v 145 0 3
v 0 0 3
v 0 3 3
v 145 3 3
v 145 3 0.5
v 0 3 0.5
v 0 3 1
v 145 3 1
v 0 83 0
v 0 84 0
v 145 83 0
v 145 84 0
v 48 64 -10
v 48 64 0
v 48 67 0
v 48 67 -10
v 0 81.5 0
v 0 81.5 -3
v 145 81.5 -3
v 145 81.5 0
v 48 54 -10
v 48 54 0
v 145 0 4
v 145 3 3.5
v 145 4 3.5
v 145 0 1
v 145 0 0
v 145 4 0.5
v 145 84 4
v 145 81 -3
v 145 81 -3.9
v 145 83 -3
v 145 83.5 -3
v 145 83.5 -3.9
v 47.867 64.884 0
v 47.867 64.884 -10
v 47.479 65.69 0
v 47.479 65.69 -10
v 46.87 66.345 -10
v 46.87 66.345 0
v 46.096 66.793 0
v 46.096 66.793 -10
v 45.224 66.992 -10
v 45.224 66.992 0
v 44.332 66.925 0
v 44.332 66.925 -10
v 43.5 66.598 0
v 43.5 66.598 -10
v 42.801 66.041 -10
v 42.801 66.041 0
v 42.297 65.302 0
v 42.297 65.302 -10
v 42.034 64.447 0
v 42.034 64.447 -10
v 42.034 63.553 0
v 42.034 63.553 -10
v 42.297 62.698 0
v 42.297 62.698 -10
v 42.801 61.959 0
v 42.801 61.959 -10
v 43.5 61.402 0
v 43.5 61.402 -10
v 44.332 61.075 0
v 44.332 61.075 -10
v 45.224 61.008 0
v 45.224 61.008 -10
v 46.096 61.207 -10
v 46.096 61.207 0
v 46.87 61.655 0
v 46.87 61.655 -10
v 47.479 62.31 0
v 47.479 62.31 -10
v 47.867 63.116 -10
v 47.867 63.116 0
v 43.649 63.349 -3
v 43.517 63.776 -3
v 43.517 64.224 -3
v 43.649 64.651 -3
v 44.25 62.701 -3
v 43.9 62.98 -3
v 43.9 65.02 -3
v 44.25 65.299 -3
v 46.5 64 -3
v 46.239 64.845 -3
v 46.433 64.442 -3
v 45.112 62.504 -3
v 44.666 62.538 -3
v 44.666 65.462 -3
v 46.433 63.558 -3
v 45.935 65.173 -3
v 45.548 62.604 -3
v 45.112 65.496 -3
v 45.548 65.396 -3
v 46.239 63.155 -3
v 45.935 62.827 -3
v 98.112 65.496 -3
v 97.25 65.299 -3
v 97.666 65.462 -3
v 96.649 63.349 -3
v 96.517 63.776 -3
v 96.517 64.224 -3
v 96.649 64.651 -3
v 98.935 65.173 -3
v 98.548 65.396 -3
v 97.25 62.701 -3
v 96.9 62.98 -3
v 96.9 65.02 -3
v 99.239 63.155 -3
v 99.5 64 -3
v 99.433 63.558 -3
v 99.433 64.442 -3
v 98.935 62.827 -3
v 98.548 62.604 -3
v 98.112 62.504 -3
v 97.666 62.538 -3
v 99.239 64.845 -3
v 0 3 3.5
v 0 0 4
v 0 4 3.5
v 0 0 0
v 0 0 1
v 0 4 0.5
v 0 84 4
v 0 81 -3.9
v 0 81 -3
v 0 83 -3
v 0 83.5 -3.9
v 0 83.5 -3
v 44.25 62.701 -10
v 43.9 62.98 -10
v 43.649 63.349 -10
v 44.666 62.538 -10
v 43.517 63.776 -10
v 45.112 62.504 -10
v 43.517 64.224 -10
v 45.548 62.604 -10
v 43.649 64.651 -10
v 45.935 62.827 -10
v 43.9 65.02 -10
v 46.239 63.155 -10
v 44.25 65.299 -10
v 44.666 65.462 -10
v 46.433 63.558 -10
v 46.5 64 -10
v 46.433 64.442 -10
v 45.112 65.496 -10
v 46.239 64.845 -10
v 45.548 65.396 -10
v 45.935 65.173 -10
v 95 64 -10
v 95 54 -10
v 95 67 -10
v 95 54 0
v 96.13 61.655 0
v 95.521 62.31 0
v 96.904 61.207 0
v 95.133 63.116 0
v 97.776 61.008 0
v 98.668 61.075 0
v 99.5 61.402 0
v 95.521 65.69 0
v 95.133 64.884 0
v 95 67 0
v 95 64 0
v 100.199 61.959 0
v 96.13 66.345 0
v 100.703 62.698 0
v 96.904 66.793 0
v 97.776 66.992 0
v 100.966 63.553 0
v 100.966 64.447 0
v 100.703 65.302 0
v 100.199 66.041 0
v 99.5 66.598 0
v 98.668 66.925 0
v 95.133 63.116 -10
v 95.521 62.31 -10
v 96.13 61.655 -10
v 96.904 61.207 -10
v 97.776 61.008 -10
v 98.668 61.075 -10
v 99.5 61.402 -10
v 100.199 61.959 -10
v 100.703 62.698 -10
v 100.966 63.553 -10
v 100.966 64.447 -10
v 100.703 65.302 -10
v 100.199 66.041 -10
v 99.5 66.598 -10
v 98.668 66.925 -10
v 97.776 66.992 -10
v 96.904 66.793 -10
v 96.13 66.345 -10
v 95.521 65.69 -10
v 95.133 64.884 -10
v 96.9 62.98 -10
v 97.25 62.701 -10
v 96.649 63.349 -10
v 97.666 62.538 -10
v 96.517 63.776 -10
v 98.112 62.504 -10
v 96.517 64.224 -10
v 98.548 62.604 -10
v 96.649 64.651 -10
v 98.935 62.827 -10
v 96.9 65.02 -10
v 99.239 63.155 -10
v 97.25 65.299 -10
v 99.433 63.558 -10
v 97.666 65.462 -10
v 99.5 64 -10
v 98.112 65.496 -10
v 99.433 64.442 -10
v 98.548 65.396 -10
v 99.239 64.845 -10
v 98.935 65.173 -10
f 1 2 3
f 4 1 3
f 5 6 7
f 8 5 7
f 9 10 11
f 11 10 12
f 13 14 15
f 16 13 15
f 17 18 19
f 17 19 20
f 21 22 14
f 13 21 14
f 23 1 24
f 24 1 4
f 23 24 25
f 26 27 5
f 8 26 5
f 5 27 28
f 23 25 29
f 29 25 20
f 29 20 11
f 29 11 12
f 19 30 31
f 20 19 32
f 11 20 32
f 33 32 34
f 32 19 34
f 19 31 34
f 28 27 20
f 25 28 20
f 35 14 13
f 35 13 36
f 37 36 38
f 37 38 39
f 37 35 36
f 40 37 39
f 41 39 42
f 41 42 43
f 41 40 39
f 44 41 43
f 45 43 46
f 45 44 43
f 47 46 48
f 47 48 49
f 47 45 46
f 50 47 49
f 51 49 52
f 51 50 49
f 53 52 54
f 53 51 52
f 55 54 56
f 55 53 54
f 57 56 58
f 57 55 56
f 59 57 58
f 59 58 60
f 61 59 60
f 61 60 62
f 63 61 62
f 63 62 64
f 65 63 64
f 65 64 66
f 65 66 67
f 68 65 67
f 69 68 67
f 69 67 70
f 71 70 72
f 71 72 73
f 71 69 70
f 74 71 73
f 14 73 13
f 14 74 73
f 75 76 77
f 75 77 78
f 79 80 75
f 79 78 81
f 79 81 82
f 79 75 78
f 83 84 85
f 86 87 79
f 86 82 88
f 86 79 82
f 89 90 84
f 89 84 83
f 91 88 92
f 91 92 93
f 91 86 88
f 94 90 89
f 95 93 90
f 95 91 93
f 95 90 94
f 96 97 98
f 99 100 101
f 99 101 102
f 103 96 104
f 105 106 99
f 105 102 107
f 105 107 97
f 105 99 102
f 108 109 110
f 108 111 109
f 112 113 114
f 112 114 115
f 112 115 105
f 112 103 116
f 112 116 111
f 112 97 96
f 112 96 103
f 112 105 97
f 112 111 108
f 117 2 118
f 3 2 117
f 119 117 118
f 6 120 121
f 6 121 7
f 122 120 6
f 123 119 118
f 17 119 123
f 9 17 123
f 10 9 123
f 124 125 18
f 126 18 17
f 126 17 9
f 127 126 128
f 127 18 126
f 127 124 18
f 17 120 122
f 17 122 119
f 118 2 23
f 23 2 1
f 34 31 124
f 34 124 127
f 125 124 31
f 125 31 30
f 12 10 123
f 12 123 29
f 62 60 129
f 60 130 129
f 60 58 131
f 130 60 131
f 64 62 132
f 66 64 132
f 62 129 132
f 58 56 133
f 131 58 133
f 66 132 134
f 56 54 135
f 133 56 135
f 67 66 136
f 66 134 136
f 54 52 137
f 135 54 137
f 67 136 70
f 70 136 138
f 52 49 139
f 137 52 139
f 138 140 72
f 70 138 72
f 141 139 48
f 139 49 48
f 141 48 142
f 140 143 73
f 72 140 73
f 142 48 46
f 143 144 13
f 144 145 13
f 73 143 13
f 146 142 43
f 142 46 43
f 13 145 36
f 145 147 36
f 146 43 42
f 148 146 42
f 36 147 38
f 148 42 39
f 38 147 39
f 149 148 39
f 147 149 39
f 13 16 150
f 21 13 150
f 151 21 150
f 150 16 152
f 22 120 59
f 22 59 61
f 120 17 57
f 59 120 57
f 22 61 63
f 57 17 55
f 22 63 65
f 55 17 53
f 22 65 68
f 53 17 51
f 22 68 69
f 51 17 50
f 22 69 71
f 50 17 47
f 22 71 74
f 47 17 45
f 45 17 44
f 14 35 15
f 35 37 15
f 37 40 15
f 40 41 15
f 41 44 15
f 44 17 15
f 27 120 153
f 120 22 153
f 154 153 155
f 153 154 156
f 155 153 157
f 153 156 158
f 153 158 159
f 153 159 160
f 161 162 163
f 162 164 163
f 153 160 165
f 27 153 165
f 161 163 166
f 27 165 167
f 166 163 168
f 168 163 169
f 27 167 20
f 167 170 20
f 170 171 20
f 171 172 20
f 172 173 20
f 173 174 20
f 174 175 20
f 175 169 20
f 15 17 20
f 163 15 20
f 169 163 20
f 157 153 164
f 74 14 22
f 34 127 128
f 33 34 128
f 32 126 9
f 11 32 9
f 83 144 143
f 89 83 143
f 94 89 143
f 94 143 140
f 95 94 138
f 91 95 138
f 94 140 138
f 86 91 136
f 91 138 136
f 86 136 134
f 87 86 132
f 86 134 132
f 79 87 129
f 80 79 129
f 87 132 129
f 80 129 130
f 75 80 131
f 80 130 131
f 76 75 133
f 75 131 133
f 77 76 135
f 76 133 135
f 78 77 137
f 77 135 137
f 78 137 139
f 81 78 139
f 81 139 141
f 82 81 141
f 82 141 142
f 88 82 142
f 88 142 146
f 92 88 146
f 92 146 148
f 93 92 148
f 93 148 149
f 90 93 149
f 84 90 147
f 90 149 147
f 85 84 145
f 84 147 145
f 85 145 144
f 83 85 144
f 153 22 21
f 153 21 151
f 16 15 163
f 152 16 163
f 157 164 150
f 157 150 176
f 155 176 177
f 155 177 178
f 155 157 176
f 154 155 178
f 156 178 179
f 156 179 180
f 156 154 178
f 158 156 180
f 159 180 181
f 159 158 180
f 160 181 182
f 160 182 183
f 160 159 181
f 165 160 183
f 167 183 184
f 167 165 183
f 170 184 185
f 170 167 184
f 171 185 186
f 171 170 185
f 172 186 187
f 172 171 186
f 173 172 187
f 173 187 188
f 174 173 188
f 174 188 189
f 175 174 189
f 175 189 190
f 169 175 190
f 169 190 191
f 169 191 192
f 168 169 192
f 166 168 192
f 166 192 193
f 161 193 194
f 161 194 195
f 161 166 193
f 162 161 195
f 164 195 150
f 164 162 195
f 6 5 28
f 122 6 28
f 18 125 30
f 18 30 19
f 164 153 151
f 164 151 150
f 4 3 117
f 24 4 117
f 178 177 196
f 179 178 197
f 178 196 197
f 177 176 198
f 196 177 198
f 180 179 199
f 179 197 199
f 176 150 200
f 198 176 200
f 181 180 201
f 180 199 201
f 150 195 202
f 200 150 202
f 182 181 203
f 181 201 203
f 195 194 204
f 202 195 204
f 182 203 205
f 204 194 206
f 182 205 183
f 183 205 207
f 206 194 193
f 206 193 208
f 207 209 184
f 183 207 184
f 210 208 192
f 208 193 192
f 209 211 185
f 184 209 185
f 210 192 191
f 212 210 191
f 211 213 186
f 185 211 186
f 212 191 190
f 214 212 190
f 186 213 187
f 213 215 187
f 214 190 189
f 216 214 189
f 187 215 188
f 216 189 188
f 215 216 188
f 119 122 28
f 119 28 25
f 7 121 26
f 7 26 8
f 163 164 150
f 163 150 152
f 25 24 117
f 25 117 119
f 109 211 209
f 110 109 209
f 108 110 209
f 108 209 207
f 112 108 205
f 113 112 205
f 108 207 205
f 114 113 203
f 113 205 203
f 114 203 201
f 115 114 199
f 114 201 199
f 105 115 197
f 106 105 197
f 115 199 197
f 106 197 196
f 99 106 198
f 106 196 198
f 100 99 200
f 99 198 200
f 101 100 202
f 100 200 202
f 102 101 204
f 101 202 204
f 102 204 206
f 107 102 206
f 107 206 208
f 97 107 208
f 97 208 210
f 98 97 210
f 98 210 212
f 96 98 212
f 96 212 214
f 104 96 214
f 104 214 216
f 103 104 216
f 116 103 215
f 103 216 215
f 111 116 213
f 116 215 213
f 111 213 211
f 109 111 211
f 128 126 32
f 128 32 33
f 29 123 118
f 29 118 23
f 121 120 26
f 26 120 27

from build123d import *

# Parameters (mm, degrees)
SKETCH185_W     = 145
SKETCH185_H     = 84
PAD088_DEPTH    = 4
SKETCH186_W     = 1.5
SKETCH186_H     = 3
SKETCH186_W_2   = 2.5
SKETCH186_H_2   = 0.9
PAD089_DEPTH    = 145
SKETCH187_W     = 3
SKETCH187_H     = 2
SKETCH187_W_2   = 1
SKETCH187_H_2   = 3
POCKET109_DEPTH = 145
SKETCH188_R     = 3
SKETCH188_W     = 47
SKETCH188_H     = 13
PAD090_DEPTH    = 10
SKETCH189_R     = 1.5
POCKET110_DEPTH = 7


with BuildPart() as part:
    # Sketch185 → Pad088 (new body)
    with BuildSketch(Plane.XY):
        with Locations((72.5, 42)):
            Rectangle(SKETCH185_W, SKETCH185_H)
    extrude(amount=PAD088_DEPTH)

    # Sketch186 → Pad089 (join)
    with BuildSketch(Plane.YZ):
        with Locations((82.25, -1.5)):
            Rectangle(SKETCH186_W, SKETCH186_H)
        with Locations((82.25, -3.45)):
            Rectangle(SKETCH186_W_2, SKETCH186_H_2)
    extrude(amount=PAD089_DEPTH)

    # Sketch187 → Pocket109 (cut)
    with BuildSketch(Plane.YZ):
        with Locations((1.5, 2)):
            Rectangle(SKETCH187_W, SKETCH187_H)
        with Locations((3.5, 2)):
            Rectangle(SKETCH187_W_2, SKETCH187_H_2)
    extrude(amount=POCKET109_DEPTH, mode=Mode.SUBTRACT)

    # Sketch188 → Pad090 (join)
    with BuildSketch(Plane.XY):
        with Locations((98, 64)):
            Circle(SKETCH188_R)
        with Locations((45, 64)):
            Circle(SKETCH188_R)
        with Locations((71.5, 60.5)):
            Rectangle(SKETCH188_W, SKETCH188_H)
    extrude(amount=-PAD090_DEPTH)

    # Sketch189 (on Face1 of Pad090) → Pocket110 (cut)
    with BuildSketch(Plane(origin=(0, 0, -10), x_dir=(1, 0, 0), z_dir=(0, 0, -1))):
        with Locations((45, -64)):
            Circle(SKETCH189_R)
        with Locations((98, -64)):
            Circle(SKETCH189_R)
    extrude(amount=-POCKET110_DEPTH, mode=Mode.SUBTRACT)


solid = part.part
